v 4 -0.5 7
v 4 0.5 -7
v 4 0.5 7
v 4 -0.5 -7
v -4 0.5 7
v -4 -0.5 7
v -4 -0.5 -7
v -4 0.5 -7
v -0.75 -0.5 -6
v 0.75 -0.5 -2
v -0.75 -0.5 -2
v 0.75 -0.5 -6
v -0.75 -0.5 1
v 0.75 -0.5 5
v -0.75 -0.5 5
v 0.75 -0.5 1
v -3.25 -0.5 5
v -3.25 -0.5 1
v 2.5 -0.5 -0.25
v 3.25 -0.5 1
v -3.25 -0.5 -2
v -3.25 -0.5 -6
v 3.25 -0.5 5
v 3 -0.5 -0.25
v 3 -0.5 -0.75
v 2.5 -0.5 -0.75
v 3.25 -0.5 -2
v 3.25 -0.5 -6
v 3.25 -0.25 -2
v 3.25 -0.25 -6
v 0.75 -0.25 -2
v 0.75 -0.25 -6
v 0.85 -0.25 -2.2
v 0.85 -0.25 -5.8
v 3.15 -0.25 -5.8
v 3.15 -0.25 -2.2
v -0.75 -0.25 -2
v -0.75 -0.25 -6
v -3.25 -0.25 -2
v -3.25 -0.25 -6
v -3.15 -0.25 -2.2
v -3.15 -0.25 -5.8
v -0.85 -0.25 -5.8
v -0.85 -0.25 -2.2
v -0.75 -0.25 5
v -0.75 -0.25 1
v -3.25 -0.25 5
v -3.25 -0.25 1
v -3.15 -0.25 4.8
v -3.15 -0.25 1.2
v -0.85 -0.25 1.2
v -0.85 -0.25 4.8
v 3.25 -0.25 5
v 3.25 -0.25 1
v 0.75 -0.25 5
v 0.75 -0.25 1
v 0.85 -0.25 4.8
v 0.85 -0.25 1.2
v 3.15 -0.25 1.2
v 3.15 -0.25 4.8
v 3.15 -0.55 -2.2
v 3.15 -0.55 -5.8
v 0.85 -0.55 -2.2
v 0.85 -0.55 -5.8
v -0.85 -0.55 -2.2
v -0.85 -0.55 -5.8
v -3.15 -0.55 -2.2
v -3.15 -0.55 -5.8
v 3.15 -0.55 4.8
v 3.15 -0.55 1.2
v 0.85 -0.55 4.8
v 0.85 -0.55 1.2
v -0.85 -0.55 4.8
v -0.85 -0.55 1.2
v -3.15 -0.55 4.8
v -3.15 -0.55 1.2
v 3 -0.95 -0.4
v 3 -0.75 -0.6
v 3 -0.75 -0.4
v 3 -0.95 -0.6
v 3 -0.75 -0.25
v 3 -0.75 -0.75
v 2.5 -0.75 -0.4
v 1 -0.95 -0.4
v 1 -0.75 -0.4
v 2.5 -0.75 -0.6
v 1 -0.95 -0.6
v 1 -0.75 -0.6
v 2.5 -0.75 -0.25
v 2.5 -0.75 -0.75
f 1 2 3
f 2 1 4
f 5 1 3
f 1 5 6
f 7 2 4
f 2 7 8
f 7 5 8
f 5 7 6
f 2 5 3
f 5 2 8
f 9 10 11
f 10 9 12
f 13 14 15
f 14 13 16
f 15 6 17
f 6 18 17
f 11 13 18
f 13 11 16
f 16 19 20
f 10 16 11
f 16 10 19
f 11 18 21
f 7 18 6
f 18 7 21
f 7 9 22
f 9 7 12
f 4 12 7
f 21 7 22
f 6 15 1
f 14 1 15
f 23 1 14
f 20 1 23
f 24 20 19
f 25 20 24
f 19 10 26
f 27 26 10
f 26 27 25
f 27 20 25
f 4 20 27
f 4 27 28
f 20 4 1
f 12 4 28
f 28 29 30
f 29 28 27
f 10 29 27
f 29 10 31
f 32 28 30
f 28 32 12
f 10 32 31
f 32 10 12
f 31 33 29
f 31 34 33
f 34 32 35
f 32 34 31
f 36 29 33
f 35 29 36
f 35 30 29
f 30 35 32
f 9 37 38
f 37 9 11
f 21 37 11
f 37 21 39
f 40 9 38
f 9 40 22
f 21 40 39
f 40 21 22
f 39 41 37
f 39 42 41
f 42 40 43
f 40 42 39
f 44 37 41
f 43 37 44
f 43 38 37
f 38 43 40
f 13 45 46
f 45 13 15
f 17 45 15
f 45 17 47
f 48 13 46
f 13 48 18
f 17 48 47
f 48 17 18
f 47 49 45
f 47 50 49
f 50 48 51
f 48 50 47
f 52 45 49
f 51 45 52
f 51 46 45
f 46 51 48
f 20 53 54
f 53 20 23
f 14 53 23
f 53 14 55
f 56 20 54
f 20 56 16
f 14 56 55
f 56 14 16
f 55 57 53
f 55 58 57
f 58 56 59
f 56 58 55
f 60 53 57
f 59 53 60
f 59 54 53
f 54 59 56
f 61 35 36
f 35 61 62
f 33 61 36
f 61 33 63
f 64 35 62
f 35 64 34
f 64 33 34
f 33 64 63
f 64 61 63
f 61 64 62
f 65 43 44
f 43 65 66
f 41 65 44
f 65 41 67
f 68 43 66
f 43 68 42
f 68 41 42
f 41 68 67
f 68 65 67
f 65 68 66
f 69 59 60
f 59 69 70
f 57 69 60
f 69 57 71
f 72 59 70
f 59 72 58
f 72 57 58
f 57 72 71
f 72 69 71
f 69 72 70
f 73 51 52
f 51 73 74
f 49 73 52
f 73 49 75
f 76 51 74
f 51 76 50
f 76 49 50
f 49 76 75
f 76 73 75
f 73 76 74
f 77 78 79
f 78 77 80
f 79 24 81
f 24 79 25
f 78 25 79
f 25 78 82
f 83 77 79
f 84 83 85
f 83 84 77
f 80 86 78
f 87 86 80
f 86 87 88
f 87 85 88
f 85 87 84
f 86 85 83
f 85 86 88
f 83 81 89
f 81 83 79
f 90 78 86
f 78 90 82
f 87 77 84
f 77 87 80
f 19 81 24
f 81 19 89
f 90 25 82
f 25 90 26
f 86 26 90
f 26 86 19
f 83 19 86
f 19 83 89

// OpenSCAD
module Door(){
        difference(){
            color("#664433")
            cube([8,1,14], center = true );

            color("#553311")
            translate([2,-1,-4])
            color("#664433")
            cube([2.5,1.5,4], center = true );

            color("#553311")
            translate([-2,-1,-4])
            color("#664433")
            cube([2.5,1.5,4], center = true );

            color("#553311")
            translate([-2,-1,3])
            color("#664433")
            cube([2.5,1.5,4], center = true );
             
            color("#553311"){
            translate([2,-1,3])
            color("#664433")
            cube([2.5,1.5,4], center = true );
            }

        }

    color("#664433")
    translate([2,-0.3,-4])
    cube([2.3,0.5,3.6], center = true);

    color("#664433")
    translate([-2,-0.3,-4])
    cube([2.3,0.5,3.6], center = true);

    color("#664433")
    translate([2,-0.3,3])
    cube([2.3,0.5,3.6], center = true);

    color("#664433")
    translate([-2,-0.3,3])
    cube([2.3,0.5,3.6], center = true);

    color("#ada192")
    translate([2,-0.85,-0.5])
    color("#664433")
    cube([2,0.2,0.2], center = true );
    color("#ada192")
    translate([2.75,-0.5,-0.5])
    color("#664433")
    cube([0.5,0.5,0.5], center = true );

}


Door();
